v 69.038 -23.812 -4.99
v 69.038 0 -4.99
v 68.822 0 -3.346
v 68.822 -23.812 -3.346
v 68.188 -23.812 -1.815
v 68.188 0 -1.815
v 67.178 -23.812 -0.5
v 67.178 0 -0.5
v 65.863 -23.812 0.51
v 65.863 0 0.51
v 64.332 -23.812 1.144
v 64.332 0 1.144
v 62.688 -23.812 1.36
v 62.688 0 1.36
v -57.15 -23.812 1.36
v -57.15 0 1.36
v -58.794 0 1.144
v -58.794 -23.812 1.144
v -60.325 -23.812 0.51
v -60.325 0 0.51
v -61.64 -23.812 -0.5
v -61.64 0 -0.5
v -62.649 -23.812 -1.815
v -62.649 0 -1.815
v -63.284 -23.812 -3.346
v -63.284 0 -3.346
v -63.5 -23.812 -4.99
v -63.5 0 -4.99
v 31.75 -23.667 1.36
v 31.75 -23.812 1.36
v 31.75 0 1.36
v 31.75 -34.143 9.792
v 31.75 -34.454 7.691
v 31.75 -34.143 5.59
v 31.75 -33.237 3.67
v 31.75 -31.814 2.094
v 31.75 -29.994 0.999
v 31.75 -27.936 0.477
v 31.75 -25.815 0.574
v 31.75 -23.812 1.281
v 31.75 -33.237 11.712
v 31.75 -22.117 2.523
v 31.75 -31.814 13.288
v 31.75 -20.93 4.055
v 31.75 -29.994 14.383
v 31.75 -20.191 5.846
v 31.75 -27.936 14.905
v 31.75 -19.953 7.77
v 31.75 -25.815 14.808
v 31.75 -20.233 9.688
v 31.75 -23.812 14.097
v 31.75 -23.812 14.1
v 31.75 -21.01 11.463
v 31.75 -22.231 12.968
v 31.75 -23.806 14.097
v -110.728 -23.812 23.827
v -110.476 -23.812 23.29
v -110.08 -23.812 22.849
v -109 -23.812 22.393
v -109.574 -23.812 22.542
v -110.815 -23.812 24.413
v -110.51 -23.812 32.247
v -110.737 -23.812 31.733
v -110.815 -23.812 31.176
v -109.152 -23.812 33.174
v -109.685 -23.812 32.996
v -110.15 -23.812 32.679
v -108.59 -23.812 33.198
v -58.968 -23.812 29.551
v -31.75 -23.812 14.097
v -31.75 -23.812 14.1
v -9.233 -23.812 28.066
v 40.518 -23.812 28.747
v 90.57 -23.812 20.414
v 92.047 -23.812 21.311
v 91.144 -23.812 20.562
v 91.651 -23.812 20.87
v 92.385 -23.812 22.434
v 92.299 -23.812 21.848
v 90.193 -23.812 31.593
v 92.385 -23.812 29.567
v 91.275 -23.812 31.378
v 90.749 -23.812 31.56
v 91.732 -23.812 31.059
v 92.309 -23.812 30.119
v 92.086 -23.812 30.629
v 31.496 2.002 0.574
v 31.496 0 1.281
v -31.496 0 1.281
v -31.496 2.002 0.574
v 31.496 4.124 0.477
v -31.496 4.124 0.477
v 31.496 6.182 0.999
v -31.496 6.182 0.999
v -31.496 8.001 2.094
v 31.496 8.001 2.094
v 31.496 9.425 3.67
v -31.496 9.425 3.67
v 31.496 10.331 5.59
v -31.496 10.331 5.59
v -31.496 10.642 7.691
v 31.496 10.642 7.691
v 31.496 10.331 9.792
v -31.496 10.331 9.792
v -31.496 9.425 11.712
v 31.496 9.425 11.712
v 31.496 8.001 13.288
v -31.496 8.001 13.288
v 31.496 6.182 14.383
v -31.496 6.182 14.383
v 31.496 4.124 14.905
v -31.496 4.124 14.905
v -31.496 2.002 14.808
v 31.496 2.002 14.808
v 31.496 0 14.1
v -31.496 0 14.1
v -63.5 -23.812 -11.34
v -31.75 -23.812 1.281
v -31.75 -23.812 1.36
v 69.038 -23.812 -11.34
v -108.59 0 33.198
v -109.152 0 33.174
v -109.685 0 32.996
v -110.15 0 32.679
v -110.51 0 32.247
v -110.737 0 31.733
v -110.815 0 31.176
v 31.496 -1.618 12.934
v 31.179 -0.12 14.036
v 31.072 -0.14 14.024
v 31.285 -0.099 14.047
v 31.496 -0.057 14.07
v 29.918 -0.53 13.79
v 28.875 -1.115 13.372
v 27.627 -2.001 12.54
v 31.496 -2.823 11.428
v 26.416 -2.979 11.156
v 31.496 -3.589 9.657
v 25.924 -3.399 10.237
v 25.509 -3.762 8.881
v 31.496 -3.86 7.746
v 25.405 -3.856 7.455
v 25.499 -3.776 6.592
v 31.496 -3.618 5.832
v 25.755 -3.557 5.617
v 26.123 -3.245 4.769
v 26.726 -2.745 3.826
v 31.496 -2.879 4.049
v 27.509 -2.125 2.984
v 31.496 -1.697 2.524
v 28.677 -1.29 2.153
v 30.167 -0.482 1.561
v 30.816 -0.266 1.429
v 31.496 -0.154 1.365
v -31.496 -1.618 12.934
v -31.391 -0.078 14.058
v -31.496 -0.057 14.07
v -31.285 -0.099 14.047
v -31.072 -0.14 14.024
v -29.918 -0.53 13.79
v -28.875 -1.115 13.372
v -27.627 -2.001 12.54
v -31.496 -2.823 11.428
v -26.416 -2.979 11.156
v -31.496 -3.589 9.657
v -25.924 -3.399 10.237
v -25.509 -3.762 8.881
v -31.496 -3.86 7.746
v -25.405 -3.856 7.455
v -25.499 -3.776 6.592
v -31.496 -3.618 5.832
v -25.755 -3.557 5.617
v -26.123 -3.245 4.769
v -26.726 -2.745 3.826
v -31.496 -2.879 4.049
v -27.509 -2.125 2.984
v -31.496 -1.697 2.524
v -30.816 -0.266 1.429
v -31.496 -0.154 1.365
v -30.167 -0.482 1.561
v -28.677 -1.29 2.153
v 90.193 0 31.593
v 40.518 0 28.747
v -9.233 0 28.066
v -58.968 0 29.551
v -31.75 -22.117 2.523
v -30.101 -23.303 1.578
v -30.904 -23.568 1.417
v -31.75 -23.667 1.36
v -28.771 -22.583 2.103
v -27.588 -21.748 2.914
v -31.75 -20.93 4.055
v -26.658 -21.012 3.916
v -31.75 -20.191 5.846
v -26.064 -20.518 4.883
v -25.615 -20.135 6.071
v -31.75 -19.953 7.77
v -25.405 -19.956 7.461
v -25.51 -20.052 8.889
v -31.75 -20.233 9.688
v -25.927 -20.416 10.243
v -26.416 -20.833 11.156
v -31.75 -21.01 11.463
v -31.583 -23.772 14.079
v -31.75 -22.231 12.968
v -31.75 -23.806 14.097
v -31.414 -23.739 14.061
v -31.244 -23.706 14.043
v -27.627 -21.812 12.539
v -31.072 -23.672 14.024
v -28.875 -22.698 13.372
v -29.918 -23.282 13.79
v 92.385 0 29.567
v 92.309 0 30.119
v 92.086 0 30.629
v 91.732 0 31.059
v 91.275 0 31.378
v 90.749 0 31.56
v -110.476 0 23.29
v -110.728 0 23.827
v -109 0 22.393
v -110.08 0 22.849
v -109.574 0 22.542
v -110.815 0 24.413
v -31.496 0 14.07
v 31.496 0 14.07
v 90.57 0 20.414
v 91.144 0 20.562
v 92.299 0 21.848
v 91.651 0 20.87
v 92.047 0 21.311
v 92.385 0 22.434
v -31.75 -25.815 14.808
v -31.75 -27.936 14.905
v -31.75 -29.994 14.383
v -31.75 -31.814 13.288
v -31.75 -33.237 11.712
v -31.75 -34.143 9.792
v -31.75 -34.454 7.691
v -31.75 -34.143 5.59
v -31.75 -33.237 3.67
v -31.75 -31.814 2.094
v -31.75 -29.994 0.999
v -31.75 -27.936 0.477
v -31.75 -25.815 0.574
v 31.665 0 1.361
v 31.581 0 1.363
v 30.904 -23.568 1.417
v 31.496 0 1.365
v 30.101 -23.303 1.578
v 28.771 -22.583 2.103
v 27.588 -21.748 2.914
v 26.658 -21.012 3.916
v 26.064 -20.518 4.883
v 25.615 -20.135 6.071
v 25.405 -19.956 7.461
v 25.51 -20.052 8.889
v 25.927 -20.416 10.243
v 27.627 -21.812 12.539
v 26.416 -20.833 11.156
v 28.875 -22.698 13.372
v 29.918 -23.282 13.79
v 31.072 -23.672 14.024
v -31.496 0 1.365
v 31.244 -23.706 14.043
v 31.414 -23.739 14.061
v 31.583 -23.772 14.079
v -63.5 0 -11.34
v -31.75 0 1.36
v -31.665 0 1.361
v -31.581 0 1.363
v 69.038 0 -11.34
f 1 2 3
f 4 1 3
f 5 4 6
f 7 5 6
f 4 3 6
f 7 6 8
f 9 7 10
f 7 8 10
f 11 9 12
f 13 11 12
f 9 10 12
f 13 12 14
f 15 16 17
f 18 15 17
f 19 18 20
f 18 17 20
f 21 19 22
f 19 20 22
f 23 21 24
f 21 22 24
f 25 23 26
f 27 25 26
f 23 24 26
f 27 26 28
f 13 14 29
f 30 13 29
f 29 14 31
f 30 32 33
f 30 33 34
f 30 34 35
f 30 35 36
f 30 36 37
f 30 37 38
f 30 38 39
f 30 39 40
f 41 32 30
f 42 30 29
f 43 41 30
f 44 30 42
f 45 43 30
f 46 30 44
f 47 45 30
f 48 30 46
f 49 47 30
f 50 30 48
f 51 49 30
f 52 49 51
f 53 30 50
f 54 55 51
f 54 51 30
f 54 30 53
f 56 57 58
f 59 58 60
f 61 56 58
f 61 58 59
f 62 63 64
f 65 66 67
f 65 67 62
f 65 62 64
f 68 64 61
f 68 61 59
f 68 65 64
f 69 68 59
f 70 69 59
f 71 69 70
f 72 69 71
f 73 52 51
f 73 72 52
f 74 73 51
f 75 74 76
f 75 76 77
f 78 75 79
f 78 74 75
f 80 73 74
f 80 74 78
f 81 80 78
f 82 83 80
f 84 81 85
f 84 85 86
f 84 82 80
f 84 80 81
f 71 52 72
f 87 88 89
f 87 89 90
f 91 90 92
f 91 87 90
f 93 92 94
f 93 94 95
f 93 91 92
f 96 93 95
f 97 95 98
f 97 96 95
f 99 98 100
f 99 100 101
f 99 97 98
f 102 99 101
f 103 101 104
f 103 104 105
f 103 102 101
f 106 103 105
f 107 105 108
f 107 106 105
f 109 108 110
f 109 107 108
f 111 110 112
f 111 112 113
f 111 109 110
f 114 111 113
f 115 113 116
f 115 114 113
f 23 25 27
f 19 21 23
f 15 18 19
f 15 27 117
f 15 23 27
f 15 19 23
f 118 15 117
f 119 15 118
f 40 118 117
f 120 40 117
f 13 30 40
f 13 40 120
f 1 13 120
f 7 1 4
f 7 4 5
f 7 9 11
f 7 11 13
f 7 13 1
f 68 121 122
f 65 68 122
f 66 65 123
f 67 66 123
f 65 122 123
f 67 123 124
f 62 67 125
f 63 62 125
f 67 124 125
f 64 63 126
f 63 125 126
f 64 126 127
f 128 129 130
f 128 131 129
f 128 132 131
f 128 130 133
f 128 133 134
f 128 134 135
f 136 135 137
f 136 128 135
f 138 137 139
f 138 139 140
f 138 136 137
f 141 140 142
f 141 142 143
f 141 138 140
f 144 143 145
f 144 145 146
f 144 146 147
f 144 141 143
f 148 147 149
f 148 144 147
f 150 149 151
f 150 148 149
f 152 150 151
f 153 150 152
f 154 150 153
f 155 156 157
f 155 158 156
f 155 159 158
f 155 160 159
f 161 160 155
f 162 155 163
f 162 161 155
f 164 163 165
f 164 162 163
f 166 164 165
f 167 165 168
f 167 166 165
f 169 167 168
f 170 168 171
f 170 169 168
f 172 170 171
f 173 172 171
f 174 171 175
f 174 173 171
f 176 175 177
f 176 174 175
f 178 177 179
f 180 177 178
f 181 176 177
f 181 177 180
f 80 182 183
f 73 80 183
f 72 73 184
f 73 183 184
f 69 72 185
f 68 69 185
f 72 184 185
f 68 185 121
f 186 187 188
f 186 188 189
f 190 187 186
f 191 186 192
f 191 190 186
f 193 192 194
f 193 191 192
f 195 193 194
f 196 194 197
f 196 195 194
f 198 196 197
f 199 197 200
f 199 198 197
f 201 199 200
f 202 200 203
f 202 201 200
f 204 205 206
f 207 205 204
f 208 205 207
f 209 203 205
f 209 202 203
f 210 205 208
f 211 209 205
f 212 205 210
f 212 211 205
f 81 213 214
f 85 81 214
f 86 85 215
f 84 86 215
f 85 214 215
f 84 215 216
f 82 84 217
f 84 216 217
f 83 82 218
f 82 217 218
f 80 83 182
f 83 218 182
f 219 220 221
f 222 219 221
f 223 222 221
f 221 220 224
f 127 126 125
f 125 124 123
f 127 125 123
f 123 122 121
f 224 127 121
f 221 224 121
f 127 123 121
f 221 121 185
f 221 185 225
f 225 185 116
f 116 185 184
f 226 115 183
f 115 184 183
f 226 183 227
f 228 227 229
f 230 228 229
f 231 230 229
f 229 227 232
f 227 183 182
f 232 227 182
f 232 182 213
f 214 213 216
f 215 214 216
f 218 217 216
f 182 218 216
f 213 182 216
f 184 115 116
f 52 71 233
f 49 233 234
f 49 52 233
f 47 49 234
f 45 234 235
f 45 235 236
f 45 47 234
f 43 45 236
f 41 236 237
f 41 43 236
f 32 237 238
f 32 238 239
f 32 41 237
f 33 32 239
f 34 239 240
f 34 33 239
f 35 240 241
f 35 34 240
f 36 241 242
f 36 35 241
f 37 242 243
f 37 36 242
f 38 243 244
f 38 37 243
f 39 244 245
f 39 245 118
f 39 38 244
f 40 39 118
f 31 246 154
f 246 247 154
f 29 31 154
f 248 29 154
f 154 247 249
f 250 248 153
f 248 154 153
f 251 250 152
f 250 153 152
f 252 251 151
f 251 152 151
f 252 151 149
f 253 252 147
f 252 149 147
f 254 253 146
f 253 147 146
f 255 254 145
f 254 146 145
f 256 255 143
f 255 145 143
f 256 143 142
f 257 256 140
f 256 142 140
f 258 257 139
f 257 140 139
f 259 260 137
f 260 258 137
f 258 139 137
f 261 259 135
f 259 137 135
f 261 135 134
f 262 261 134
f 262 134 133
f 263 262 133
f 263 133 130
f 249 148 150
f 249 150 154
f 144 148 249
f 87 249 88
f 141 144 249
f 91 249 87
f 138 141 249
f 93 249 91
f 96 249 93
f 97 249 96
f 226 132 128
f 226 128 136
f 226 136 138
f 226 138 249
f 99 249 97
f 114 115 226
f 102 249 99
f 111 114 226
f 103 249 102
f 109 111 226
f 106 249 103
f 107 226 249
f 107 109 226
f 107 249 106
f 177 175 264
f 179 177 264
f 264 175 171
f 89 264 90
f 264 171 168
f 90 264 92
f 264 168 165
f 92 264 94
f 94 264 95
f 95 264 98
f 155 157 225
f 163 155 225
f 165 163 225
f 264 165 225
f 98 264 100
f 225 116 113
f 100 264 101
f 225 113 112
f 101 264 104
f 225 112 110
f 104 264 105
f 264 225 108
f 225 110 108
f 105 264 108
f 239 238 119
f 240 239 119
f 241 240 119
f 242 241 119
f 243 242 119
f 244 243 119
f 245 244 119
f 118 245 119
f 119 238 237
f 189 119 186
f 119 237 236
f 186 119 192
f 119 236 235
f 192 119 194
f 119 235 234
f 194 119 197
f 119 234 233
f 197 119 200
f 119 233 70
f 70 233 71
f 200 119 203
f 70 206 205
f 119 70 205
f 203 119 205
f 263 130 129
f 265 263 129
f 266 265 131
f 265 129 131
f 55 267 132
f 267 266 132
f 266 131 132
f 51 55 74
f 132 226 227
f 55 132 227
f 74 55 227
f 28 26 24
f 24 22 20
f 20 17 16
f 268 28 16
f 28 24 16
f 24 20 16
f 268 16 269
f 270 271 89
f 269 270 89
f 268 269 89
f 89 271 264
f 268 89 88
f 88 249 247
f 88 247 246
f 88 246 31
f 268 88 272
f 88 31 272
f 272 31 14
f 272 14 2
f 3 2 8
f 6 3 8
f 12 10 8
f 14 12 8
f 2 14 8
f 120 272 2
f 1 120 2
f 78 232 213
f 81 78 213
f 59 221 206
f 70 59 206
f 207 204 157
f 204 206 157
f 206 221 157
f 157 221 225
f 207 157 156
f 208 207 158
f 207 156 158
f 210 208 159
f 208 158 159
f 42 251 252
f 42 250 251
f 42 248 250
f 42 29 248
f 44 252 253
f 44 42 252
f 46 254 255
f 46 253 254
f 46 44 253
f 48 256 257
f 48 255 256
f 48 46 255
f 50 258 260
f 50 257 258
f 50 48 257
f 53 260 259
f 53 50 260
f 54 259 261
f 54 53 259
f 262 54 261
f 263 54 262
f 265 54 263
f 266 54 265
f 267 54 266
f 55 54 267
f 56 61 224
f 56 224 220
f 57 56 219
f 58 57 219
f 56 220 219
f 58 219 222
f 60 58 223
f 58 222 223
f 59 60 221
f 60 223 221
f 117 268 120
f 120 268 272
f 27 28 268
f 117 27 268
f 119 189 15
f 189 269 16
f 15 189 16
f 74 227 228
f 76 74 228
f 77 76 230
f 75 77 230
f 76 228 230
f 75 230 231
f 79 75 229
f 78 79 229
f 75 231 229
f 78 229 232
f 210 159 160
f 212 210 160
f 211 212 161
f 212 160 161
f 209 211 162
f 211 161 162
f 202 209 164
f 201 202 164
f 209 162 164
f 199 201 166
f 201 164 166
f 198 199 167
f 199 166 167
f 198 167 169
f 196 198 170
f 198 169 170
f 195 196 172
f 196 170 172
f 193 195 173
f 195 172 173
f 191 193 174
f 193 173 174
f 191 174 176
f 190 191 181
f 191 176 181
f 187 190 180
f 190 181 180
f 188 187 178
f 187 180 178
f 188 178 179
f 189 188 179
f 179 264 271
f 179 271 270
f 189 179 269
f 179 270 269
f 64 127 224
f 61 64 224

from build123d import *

# Parameters (mm, degrees)
F1_DEPTH = 23.8125
F2_R     = 7.251035
F3_DEPTH = 31.496
F4_DEPTH = 31.75


with BuildPart() as f1:
    # F0 (on Front) → F1 (new body)
    with BuildSketch(Plane.XZ):
        with BuildLine():
            Line((-63.5, -4.98963), (-63.5, -11.33963))
            Line((-63.5, -11.33963), (0, -11.33963))
            Line((0, -11.33963), (69.038319, -11.33963))
            Line((69.038319, -11.33963), (69.038319, -4.98963))
            ThreePointArc((69.038319, -4.98963), (67.178447, -0.499502), (62.688319, 1.36037))
            Line((62.688319, 1.36037), (31.75, 1.36037))
            ThreePointArc((31.75, 1.36037), (25.409083, 7.37086), (31.071951, 14.024066))
            Line((31.071951, 14.024066), (90.570115, 20.413778))
            ThreePointArc((90.570115, 20.413778), (91.864747, 21.076197), (92.385139, 22.434161))
            Line((92.385139, 22.434161), (92.385139, 29.566896))
            ThreePointArc((92.385139, 29.566896), (91.732126, 31.05935), (90.192796, 31.59256))
            ThreePointArc((90.192796, 31.59256), (-9.233486, 28.065795), (-108.589812, 33.198436))
            ThreePointArc((-108.589812, 33.198436), (-110.149746, 32.679172), (-110.814861, 31.175627))
            Line((-110.814861, 31.175627), (-110.814861, 24.413392))
            ThreePointArc((-110.814861, 24.413392), (-110.294469, 23.055428), (-108.999837, 22.393009))
            Line((-108.999837, 22.393009), (-31.071951, 14.024066))
            ThreePointArc((-31.071951, 14.024066), (-25.409083, 7.37086), (-31.75, 1.36037))
            Line((-31.75, 1.36037), (-57.15, 1.36037))
            ThreePointArc((-57.15, 1.36037), (-61.640128, -0.499502), (-63.5, -4.98963))
        make_face()
    extrude(amount=F1_DEPTH)

    # F2 (on Right) → F3 (join, symmetric)
    with BuildSketch(Plane.YZ):
        with Locations((3.39075, 7.690888)):
            Circle(F2_R)
    extrude(amount=F3_DEPTH, both=True)

    # F2 (on Right) → F4 (join, symmetric)
    with BuildSketch(Plane.YZ):
        with Locations((-27.20325, 7.690888)):
            Circle(F2_R)
    extrude(amount=F4_DEPTH, both=True)


solid = f1.part
